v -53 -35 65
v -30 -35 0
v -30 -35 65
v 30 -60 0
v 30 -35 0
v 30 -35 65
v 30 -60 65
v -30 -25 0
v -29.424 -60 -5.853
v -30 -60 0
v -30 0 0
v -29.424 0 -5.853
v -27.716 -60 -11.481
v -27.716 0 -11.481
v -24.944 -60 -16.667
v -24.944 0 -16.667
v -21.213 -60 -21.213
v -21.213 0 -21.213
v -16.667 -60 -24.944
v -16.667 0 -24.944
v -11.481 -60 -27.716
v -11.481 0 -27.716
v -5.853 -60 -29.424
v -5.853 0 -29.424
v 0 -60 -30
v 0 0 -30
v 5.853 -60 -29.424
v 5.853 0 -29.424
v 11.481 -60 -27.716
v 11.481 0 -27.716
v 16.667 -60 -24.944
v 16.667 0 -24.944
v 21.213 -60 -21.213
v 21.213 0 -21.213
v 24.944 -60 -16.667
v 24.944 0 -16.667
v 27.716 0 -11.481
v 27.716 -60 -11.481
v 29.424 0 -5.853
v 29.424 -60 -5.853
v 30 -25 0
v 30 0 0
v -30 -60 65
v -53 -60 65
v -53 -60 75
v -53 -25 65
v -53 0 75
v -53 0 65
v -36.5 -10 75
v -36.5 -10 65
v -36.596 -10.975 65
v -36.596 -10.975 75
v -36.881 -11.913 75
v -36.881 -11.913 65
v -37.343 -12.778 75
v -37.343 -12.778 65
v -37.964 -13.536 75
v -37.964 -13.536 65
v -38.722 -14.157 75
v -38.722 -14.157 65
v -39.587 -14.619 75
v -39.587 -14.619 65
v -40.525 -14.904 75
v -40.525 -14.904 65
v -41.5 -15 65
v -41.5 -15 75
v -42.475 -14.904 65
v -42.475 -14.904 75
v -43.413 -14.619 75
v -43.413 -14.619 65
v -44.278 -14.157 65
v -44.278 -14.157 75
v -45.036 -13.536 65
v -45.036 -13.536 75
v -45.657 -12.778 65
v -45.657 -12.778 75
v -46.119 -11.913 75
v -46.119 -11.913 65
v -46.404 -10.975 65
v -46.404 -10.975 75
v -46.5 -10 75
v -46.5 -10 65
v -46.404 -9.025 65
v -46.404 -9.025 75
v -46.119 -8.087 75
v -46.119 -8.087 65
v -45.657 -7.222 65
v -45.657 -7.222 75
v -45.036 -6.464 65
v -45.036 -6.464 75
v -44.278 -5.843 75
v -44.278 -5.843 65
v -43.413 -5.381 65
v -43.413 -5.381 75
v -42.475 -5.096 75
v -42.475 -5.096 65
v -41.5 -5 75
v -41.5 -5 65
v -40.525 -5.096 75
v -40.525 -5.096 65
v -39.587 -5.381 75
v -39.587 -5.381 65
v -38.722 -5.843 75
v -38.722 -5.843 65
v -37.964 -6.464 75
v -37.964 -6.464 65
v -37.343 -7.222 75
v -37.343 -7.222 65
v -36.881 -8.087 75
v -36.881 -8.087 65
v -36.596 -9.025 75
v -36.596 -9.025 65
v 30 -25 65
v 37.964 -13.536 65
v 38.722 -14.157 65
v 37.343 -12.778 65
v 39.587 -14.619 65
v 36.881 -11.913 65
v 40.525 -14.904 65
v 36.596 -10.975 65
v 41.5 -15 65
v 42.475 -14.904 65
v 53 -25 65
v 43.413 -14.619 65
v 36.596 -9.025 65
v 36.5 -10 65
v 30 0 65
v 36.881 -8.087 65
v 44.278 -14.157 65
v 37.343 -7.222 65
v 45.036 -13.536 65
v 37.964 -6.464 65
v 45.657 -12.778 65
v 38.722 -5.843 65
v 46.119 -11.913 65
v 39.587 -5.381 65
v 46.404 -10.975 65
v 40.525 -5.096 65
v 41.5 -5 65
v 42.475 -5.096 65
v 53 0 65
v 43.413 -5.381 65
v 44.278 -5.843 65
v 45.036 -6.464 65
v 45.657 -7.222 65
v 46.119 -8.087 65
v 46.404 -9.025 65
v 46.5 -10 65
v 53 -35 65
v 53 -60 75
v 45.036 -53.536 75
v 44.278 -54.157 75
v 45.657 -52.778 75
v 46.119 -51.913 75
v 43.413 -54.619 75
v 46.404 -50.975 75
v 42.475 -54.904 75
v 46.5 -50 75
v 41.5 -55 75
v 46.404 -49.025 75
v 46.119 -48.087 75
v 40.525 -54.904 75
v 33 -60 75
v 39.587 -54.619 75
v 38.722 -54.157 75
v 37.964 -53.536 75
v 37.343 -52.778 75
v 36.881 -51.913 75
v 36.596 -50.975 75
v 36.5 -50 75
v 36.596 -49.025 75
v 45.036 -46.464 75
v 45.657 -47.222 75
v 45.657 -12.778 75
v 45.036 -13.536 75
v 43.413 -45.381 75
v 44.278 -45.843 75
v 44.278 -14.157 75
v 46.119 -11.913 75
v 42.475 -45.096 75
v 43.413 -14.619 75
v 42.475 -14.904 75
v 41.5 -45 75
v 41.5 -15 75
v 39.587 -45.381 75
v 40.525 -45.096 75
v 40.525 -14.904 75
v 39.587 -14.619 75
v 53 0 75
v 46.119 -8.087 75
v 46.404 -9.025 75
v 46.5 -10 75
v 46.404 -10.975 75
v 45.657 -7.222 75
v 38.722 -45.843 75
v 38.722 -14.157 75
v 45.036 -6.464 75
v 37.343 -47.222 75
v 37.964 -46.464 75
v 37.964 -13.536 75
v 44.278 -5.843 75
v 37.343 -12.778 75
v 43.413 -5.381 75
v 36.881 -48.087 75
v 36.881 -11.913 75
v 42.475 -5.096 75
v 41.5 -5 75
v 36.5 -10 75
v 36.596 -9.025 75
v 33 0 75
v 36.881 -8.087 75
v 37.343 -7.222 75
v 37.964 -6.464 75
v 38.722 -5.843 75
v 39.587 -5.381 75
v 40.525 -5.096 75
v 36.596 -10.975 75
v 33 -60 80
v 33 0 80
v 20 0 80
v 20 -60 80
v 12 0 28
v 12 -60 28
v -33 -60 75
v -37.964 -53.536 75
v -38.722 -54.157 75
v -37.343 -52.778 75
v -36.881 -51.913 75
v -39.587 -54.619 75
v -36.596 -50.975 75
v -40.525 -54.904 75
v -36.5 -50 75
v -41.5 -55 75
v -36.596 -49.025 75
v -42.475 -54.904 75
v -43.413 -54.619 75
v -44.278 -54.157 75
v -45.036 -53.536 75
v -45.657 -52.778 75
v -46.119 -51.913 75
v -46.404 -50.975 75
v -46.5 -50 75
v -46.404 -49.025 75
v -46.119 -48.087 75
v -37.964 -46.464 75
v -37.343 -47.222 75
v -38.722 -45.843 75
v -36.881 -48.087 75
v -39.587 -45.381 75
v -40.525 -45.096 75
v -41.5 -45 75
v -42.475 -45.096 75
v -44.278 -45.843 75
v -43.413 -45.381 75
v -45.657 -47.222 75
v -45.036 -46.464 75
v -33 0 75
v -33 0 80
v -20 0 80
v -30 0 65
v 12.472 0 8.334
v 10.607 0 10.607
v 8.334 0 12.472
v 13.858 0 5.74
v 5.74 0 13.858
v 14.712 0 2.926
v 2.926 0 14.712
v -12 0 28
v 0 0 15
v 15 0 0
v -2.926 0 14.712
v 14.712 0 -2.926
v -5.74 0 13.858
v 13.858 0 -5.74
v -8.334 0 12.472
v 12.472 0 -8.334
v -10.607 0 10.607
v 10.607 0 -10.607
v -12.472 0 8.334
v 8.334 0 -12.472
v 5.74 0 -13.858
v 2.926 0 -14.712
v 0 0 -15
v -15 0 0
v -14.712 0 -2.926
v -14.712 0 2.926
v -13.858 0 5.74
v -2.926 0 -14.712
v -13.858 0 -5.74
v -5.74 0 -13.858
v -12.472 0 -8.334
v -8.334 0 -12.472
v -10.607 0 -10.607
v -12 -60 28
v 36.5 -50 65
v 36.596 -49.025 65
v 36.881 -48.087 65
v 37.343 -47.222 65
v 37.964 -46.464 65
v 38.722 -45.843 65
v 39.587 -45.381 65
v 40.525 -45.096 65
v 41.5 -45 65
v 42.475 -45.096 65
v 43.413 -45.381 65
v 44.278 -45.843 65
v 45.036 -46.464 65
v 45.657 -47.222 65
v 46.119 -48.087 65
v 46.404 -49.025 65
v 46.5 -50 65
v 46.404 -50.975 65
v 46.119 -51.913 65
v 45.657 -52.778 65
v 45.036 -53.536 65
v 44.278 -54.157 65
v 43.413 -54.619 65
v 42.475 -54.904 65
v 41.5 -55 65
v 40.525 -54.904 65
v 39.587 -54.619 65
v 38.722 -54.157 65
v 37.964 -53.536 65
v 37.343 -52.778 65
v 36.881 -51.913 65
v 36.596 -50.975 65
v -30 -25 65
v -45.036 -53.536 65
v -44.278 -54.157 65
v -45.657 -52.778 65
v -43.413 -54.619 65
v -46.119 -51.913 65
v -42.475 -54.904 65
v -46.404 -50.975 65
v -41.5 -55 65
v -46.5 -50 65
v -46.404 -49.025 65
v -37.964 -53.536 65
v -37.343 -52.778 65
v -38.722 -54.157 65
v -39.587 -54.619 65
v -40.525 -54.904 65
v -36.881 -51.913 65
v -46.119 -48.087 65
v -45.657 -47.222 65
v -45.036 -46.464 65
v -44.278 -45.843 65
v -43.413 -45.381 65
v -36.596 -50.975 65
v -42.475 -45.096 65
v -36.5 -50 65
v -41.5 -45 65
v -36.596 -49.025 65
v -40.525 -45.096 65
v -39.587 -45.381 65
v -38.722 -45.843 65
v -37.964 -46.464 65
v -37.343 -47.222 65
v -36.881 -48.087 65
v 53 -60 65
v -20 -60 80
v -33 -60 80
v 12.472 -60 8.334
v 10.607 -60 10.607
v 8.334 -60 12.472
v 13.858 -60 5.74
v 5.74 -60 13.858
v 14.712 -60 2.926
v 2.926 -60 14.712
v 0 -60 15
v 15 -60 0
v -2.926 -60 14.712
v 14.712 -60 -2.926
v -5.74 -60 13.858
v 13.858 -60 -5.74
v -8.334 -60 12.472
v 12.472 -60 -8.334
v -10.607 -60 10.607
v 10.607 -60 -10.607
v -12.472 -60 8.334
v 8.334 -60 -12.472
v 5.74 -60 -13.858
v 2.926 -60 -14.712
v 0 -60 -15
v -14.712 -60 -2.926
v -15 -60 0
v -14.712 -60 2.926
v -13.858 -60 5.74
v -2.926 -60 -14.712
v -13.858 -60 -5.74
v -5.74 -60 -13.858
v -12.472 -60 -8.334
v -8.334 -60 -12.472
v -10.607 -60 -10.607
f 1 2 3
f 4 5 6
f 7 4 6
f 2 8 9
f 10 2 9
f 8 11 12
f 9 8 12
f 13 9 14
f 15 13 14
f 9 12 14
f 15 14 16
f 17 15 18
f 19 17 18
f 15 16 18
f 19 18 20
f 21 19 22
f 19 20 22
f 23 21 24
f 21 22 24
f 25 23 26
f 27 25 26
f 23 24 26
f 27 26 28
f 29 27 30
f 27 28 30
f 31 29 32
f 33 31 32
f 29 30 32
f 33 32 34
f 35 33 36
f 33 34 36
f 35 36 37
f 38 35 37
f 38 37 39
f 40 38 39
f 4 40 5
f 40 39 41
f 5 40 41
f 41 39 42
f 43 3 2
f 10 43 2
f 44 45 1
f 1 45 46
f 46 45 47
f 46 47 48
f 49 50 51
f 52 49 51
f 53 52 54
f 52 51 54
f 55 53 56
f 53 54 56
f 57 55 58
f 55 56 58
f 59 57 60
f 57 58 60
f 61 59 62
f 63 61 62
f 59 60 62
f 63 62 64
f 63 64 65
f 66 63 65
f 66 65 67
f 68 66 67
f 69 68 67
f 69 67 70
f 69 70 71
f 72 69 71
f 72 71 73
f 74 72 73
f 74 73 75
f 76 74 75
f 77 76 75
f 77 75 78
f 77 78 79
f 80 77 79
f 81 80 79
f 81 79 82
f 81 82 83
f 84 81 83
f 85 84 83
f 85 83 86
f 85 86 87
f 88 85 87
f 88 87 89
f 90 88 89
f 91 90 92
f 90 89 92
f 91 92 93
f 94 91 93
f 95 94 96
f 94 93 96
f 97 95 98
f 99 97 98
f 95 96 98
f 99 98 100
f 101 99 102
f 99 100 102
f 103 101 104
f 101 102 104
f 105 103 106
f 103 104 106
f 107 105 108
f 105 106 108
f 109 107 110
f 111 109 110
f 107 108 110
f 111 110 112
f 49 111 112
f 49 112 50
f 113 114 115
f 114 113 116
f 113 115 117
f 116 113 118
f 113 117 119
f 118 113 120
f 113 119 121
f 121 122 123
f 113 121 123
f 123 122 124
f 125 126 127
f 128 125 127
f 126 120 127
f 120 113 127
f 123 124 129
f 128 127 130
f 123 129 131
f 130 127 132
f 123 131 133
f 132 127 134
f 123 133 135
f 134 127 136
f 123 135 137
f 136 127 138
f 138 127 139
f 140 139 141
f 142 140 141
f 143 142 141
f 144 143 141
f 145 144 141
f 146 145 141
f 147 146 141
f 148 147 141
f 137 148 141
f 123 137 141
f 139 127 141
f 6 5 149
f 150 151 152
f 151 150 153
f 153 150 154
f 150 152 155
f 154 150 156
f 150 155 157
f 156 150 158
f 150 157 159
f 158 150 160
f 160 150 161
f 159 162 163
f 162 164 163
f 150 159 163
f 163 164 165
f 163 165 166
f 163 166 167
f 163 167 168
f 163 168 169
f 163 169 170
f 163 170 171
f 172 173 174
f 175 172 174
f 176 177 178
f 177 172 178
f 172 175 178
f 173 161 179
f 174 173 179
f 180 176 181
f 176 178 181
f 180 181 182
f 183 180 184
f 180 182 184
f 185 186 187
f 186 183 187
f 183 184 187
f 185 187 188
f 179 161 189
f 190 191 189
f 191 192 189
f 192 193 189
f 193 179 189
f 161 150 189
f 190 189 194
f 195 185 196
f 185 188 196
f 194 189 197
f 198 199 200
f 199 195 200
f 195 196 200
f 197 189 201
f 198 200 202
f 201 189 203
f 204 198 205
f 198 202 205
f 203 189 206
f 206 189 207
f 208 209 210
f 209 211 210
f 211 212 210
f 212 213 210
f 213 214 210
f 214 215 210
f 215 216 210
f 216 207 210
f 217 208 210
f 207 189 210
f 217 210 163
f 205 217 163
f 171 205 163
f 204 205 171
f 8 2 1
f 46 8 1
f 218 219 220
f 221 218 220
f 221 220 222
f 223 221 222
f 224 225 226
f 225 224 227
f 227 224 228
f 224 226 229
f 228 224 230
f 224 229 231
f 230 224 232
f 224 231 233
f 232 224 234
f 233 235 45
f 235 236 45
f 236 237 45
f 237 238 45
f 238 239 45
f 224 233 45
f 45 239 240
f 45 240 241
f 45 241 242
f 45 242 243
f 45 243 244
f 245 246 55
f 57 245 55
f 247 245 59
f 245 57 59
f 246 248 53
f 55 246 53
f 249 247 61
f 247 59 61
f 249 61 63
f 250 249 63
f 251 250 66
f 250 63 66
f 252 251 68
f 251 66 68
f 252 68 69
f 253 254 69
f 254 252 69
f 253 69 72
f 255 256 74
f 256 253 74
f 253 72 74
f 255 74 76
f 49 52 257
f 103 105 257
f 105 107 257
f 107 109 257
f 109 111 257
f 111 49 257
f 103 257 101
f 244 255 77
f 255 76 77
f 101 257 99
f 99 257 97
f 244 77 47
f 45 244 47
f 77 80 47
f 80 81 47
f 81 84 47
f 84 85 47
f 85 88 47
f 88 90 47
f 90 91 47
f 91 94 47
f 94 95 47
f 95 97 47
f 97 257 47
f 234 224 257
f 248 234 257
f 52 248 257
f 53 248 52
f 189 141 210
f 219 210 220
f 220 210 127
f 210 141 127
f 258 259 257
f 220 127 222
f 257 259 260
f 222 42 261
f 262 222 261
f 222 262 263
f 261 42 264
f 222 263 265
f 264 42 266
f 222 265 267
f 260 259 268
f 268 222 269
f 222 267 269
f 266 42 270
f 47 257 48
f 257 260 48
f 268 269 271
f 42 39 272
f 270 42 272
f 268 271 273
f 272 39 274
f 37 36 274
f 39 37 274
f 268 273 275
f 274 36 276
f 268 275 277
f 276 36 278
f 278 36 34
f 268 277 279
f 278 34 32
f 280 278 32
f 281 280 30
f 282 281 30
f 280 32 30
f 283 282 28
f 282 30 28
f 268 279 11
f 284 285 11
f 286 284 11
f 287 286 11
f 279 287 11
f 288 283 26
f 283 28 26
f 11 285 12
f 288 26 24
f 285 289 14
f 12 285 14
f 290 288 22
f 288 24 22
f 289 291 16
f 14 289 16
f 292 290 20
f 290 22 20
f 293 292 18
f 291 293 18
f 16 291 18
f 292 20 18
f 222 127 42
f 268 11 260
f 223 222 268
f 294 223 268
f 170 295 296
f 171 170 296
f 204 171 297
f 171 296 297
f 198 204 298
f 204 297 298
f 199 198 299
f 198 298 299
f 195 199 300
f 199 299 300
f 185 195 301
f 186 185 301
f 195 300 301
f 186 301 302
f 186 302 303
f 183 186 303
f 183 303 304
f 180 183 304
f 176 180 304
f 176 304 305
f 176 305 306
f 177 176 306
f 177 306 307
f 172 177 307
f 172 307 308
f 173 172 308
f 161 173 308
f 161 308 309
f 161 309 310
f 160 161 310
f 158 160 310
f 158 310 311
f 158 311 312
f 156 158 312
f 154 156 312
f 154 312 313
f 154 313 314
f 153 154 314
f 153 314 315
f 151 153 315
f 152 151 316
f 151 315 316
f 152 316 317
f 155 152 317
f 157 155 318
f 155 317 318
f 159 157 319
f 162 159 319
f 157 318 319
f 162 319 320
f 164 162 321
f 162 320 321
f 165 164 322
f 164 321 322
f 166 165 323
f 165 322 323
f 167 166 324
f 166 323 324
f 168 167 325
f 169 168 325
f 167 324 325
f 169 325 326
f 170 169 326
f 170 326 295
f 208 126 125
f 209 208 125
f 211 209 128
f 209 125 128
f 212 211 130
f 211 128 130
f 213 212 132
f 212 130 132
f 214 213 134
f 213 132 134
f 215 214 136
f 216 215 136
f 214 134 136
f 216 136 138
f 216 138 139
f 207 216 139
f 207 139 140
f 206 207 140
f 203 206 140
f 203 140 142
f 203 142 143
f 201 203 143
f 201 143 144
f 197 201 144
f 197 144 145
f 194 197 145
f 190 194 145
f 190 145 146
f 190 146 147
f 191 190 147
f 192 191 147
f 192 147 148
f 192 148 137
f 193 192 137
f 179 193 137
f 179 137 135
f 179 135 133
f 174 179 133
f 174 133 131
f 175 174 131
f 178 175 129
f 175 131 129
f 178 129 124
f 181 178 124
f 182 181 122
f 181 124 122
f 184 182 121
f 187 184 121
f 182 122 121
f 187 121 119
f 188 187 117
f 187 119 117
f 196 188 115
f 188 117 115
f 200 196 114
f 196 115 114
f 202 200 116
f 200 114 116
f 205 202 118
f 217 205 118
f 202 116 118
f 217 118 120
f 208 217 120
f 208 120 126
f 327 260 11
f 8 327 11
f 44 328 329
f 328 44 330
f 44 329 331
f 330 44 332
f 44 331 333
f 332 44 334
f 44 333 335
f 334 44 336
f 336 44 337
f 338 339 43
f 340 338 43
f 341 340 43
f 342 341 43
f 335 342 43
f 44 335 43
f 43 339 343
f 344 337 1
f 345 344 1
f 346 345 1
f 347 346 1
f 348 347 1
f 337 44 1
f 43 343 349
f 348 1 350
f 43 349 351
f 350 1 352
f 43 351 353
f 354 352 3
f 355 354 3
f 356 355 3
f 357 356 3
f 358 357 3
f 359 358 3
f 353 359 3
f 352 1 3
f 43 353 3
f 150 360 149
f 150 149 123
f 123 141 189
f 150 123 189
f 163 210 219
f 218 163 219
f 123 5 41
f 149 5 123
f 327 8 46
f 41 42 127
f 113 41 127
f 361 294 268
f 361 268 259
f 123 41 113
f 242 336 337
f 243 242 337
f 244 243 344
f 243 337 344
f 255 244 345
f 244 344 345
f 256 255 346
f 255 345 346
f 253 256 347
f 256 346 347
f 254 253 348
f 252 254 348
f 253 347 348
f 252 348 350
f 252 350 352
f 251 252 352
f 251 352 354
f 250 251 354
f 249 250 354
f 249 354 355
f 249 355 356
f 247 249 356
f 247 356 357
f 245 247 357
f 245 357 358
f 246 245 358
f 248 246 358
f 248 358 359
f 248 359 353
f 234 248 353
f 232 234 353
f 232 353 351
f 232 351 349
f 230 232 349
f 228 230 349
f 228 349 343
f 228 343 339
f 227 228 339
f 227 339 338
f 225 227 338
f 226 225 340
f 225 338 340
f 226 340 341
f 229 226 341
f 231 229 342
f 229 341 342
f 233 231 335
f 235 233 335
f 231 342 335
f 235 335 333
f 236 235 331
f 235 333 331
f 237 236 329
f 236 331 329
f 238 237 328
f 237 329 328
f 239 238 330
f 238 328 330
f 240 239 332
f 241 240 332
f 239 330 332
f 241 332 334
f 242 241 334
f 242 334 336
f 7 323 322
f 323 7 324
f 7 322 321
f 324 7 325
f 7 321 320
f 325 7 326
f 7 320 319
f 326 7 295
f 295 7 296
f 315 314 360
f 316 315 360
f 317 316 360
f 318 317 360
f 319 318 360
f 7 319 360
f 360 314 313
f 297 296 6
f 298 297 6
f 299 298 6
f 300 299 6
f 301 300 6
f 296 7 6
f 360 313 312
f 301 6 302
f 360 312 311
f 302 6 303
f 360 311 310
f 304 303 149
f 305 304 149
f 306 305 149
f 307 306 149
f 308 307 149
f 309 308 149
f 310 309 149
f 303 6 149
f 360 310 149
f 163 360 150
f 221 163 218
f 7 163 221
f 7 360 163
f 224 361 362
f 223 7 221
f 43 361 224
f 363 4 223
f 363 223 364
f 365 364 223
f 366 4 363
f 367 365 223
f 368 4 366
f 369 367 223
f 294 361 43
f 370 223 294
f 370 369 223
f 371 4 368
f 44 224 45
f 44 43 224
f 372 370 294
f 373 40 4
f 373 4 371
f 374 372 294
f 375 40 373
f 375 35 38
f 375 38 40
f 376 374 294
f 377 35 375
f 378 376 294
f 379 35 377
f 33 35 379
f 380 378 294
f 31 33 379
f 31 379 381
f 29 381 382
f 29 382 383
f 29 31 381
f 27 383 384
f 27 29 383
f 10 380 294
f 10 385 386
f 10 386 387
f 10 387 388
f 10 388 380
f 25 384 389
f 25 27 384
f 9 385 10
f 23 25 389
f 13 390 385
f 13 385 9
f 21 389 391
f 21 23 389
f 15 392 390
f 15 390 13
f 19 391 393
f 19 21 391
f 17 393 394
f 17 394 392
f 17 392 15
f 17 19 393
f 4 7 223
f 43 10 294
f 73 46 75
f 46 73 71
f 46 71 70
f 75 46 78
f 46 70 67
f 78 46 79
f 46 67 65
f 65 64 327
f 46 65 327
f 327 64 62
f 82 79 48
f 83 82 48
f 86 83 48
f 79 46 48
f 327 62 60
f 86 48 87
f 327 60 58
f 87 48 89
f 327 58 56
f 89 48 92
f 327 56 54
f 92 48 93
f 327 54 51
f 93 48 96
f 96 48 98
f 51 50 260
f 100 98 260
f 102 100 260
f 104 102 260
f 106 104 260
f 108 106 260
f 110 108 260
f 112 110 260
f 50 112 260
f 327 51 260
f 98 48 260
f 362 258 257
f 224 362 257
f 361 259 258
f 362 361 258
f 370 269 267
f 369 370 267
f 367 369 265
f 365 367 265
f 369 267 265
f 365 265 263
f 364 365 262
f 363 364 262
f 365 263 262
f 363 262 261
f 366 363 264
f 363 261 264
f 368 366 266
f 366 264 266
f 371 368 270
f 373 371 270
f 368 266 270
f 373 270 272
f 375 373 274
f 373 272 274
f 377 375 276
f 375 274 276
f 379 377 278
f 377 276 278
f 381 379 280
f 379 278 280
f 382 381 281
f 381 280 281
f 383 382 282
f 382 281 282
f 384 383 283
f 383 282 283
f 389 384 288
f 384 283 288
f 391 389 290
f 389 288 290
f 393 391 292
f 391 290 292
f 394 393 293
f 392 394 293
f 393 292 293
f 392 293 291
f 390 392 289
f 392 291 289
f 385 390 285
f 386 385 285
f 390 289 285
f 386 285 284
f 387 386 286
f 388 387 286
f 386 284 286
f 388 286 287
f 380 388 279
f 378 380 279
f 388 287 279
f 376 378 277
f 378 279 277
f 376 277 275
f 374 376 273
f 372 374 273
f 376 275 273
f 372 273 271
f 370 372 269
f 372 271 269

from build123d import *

# Parameters (mm, degrees)
SKETCH2_R           = 15
BOSS_EXTRUDE1_DEPTH = 60
SKETCH3_R           = 5
CUT_EXTRUDE1_DEPTH  = 60
RIB1_REACH          = 102.544
SKETCH7_WALL_W      = 272.036302532
SKETCH7_WALL_H      = 10


with BuildPart() as part:
    # Sketch2 → Boss-Extrude1 (new body)
    with BuildSketch(Plane(origin=(0, 0, 0), x_dir=(1, 0, 0), z_dir=(0, 1, 0))):
        with BuildLine():
            Line((30, 0), (30, -65))
            Line((30, -65), (53, -65))
            Line((53, -65), (53, -75))
            Line((53, -75), (33, -75))
            Line((33, -75), (33, -80))
            Line((33, -80), (20, -80))
            Line((20, -80), (12, -28))
            Line((12, -28), (-12, -28))
            Line((-12, -28), (-20, -80))
            Line((-20, -80), (-33, -80))
            Line((-33, -80), (-33, -75))
            Line((-33, -75), (-53, -75))
            Line((-53, -75), (-53, -65))
            Line((-53, -65), (-30, -65))
            Line((-30, -65), (-30, 0))
            ThreePointArc((-30, 0), (0, 30), (30, 0))
        make_face()
        with Locations(Location((0, 0, 0), (0, 0, 270))):
            Circle(SKETCH2_R, mode=Mode.SUBTRACT)
    extrude(amount=-BOSS_EXTRUDE1_DEPTH)

    # Sketch3 → Cut-Extrude1 (cut)
    with BuildSketch(Plane(origin=(0, 0, 65), x_dir=(-1, 0, 0), z_dir=(0, 0, -1))):
        with Locations((-41.5, -10)):
            Circle(SKETCH3_R)
        with Locations(Location((41.5, -10, 0), (0, 0, 180))):
            Circle(SKETCH3_R)
        with Locations((41.5, -50)):
            Circle(SKETCH3_R)
        with Locations((-41.5, -50)):
            Circle(SKETCH3_R)
    extrude(amount=-CUT_EXTRUDE1_DEPTH, mode=Mode.SUBTRACT)

    # Sketch7 wall → Rib1 (add, up to next)
    with BuildSketch(Plane(origin=(41.5, -30, 32.5), x_dir=(0.333578650439, 0, 0.942722272979), z_dir=(0.942722272979, 0, -0.333578650439)), mode=Mode.PRIVATE) as rib1_sk1:
        Rectangle(SKETCH7_WALL_W, SKETCH7_WALL_H)
    rib1_tool1 = extrude(rib1_sk1.sketch, amount=-RIB1_REACH, mode=Mode.PRIVATE) - part.part
    rib1 = rib1_tool1.solids().sort_by_distance((41.5, -30, 32.5))[0]
    add(rib1)

    # Mirror1: Rib1 across plane
    add(rib1.mirror(Plane(origin=(0, 0, 0), x_dir=(0, 0, 1), z_dir=(1, 0, 0))))


solid = part.part
